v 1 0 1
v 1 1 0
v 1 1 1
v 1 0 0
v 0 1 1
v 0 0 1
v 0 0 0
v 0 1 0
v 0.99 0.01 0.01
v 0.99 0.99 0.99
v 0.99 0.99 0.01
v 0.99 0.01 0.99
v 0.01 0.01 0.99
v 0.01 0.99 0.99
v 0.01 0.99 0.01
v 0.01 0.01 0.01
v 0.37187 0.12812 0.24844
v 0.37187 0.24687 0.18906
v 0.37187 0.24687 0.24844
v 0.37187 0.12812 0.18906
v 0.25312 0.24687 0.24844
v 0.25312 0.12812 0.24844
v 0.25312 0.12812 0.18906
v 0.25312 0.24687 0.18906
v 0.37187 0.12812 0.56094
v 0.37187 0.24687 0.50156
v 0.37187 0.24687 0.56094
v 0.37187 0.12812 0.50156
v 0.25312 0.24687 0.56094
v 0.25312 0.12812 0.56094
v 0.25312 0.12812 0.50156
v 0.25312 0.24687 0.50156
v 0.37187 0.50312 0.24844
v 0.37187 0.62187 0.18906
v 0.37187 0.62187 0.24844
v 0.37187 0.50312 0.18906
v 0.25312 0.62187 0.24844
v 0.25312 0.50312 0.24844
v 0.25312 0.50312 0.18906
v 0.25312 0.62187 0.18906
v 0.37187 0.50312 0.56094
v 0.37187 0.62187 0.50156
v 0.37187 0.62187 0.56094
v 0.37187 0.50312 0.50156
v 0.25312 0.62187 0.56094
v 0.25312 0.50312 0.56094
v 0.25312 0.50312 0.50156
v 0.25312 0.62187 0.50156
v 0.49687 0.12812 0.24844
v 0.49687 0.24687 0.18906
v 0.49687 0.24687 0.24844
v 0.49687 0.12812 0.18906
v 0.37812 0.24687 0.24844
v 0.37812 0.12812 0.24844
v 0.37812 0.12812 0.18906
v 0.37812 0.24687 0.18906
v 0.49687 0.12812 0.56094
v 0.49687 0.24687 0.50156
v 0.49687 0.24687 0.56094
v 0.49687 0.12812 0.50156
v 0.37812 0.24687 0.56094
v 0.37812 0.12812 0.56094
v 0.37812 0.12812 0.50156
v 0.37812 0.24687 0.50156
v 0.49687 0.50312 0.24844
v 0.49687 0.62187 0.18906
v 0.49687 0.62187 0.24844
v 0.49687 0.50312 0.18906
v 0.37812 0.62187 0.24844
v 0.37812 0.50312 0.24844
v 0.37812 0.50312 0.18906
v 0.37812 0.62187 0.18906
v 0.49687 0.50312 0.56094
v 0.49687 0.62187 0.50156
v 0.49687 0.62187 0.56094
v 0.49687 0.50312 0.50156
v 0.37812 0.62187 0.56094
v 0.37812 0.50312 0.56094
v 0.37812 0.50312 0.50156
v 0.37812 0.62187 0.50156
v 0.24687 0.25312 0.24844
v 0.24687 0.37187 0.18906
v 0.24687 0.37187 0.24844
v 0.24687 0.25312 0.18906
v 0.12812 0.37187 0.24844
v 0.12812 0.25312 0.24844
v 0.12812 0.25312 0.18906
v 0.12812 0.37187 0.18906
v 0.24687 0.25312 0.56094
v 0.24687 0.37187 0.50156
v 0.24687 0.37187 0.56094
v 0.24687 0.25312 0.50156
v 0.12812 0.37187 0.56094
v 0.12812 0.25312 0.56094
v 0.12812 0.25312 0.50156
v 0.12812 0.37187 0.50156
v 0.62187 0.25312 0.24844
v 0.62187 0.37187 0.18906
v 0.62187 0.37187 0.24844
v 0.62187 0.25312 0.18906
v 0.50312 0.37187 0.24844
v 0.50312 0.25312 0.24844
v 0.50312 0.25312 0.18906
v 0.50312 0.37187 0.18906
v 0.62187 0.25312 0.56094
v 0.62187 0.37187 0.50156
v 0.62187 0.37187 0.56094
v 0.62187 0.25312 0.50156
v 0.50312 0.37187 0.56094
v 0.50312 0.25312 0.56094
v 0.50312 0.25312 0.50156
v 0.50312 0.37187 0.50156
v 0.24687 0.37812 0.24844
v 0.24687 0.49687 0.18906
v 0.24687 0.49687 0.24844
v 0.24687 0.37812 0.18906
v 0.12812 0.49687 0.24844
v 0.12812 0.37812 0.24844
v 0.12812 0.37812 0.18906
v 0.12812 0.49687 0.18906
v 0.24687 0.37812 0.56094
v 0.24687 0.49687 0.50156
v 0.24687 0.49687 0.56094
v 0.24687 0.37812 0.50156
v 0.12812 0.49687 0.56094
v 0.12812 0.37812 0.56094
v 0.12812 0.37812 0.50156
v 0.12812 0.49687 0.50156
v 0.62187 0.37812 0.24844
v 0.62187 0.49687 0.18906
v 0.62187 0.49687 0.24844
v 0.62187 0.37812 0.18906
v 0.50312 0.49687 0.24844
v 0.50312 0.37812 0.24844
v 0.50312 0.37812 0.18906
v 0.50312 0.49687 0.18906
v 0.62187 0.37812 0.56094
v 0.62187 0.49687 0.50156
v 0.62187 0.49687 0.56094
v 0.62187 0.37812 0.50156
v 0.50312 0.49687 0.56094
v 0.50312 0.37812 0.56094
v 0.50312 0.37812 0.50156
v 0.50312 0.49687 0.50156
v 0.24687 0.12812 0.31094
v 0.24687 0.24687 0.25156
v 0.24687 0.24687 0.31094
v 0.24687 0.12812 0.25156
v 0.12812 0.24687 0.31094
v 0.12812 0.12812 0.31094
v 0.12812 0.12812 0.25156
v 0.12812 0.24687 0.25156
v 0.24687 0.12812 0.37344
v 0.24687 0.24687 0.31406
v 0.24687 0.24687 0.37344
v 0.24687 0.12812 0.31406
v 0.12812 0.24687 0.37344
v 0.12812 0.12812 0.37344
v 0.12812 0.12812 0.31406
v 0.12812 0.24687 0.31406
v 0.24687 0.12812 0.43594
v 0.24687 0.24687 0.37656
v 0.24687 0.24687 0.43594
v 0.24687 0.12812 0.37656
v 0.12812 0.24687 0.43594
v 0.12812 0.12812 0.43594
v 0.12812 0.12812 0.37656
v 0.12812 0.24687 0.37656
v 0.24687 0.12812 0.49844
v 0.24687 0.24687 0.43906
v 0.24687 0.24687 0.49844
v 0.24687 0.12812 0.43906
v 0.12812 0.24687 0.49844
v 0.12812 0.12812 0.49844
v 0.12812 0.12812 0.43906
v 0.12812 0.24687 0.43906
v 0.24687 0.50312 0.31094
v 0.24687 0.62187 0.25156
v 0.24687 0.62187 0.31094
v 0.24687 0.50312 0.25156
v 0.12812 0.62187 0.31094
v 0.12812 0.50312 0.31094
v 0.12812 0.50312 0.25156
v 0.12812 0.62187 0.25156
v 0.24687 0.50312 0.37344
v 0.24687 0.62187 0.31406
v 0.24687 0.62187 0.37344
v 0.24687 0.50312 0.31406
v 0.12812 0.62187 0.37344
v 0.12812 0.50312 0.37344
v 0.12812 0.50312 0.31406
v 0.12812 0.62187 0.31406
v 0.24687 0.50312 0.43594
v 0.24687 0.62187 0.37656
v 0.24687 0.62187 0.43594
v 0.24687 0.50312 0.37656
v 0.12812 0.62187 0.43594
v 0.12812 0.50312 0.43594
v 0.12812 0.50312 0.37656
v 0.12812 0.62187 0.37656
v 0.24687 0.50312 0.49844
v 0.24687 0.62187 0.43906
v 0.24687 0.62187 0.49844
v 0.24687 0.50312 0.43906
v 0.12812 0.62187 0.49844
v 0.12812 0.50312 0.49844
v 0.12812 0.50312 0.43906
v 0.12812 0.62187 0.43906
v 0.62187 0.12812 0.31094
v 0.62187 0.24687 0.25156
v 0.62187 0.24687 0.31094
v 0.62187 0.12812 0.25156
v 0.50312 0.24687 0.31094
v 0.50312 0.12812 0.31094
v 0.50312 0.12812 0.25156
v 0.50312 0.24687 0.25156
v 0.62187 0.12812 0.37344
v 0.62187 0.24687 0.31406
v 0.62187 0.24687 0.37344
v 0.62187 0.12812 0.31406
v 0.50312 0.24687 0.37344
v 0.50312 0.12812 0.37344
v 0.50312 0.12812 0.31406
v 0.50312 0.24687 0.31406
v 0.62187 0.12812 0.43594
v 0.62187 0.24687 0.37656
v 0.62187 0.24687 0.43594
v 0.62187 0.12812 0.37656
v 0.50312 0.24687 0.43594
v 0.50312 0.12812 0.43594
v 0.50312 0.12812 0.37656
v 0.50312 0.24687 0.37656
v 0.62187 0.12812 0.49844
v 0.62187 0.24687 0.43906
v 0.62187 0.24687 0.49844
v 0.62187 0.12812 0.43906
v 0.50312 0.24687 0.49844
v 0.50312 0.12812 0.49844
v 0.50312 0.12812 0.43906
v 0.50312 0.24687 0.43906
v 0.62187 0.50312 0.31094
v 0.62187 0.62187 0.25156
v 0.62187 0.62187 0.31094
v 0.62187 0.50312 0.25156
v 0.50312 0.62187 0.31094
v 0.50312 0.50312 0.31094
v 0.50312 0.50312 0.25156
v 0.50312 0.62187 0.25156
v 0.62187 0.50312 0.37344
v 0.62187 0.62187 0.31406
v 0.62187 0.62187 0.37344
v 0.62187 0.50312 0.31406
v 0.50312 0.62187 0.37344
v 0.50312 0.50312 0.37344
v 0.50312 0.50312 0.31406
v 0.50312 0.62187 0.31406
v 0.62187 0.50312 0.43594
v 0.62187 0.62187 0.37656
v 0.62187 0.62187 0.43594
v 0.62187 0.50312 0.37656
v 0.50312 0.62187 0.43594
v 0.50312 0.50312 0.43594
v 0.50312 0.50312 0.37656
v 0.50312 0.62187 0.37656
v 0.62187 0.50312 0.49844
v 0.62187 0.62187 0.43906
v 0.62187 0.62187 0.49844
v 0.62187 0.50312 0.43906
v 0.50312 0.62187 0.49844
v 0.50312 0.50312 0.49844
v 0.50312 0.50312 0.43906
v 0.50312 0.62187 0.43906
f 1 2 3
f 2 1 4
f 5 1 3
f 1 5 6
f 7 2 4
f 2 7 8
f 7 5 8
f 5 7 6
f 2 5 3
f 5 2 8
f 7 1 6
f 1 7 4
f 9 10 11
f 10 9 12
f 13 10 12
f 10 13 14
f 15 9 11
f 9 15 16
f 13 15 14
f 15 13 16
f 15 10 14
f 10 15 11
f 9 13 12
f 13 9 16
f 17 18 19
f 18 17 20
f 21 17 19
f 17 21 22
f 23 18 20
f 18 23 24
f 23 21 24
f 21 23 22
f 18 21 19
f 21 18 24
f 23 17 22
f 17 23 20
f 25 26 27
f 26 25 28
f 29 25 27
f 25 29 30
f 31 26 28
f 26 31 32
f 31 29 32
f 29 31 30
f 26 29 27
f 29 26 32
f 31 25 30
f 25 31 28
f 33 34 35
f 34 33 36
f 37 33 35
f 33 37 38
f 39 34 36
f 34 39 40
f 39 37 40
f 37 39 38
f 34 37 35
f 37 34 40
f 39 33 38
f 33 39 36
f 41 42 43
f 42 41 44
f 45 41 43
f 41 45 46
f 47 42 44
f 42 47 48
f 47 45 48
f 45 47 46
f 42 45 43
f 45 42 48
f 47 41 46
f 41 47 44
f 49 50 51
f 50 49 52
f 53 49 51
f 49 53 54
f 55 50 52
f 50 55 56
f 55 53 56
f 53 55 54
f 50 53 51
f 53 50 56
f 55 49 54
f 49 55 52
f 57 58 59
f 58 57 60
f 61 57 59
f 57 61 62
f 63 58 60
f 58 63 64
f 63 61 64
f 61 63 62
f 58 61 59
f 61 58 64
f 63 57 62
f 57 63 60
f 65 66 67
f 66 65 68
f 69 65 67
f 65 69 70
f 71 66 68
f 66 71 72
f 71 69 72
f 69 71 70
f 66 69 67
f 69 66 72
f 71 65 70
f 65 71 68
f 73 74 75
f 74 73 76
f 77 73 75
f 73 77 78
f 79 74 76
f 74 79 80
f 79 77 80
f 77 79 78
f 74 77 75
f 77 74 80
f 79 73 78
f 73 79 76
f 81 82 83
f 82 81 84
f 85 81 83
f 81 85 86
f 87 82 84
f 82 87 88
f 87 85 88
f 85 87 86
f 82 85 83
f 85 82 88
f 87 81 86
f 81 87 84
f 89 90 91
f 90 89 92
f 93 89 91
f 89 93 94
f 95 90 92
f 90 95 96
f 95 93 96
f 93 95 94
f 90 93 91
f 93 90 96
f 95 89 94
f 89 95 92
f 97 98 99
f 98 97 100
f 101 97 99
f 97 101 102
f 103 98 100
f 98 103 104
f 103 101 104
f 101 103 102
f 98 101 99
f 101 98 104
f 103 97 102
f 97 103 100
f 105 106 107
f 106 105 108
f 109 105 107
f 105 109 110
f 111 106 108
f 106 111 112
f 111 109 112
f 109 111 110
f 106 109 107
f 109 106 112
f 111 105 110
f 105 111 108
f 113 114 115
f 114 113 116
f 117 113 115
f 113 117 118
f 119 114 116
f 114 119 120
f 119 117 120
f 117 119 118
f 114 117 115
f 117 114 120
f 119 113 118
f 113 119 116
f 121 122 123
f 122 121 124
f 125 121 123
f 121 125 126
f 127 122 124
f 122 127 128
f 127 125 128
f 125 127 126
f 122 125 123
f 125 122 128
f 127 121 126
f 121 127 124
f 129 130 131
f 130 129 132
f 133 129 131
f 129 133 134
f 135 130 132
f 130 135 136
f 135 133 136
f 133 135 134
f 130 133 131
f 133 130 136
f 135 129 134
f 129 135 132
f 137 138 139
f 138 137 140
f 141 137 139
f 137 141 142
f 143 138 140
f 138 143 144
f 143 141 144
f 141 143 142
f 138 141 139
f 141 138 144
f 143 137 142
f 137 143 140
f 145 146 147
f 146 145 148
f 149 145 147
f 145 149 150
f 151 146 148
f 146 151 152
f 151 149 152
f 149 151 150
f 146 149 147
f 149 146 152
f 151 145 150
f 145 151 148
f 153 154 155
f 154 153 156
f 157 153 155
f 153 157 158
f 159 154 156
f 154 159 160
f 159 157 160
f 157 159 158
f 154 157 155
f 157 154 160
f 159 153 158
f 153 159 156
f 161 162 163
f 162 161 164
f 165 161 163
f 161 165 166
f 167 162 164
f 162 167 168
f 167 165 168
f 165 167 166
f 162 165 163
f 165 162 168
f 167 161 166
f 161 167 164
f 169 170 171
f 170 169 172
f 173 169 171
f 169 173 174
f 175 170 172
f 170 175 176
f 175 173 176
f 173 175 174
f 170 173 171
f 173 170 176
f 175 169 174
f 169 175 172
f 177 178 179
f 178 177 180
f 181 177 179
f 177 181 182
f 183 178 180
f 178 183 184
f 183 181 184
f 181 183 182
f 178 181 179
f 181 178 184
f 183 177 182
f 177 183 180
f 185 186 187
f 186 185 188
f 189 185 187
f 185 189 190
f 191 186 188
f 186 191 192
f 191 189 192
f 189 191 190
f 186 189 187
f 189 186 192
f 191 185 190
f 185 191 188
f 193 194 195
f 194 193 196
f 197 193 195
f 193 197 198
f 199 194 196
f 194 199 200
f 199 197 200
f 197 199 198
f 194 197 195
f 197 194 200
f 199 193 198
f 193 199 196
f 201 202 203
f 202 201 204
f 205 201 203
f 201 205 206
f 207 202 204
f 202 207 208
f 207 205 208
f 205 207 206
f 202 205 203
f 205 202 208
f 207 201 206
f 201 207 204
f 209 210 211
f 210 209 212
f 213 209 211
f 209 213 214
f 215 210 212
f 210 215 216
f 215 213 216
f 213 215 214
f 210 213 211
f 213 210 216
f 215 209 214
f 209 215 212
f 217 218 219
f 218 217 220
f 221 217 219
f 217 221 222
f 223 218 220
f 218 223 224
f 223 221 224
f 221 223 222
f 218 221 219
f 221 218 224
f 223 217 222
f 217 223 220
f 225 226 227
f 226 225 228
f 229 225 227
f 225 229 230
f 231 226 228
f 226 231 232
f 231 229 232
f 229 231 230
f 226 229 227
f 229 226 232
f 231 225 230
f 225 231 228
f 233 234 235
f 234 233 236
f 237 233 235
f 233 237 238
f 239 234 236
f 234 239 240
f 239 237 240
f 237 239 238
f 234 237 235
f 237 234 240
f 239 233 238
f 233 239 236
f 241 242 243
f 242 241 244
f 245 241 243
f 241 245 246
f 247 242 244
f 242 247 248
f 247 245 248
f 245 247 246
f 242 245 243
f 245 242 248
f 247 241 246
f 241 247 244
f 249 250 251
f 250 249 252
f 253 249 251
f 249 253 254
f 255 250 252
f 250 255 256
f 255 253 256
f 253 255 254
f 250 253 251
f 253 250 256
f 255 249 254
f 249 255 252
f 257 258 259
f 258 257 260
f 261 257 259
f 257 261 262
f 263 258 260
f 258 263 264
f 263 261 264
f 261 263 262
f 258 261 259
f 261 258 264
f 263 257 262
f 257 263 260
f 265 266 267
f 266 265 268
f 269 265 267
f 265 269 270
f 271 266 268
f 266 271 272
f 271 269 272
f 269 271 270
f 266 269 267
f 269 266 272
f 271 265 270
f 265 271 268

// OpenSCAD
translate([0.3125, 0.1875, 0.21875]) color([0.23874719597172656, 0.5159213977515871, 0.8042715508319355]) cube([0.11875, 0.11875, 0.059375], center=true);
translate([0.3125, 0.1875, 0.53125]) color([0.6755197251802578, 0.41487488756696345, 0.5733633065217538]) cube([0.11875, 0.11875, 0.059375], center=true);
translate([0.3125, 0.5625, 0.21875]) color([0.8352652083788017, 0.4789645616530247, 0.8888242662849705]) cube([0.11875, 0.11875, 0.059375], center=true);
translate([0.3125, 0.5625, 0.53125]) color([0.7977003312522131, 0.4430245559395397, 0.5757872208285841]) cube([0.11875, 0.11875, 0.059375], center=true);
translate([0.4375, 0.1875, 0.21875]) color([0.18894415855786206, 0.8084526775944827, 0.5240727557148024]) cube([0.11875, 0.11875, 0.059375], center=true);
translate([0.4375, 0.1875, 0.53125]) color([0.33009817895383553, 0.6358447971330878, 0.274476683198677]) cube([0.11875, 0.11875, 0.059375], center=true);
translate([0.4375, 0.5625, 0.21875]) color([0.7036882936284021, 0.9548751840233447, 0.5755708060880032]) cube([0.11875, 0.11875, 0.059375], center=true);
translate([0.4375, 0.5625, 0.53125]) color([0.41204698353559877, 0.5796286851254486, 0.28286322414623355]) cube([0.11875, 0.11875, 0.059375], center=true);
translate([0.1875, 0.3125, 0.21875]) color([0.83488960487533, 0.7968053445508819, 0.9111606805714901]) cube([0.11875, 0.11875, 0.059375], center=true);
translate([0.1875, 0.3125, 0.53125]) color([0.24277728252059738, 0.2698201644401115, 0.25372921938475945]) cube([0.11875, 0.11875, 0.059375], center=true);
translate([0.5625, 0.3125, 0.21875]) color([0.3248429479181304, 0.33731838939050207, 0.46012102584031667]) cube([0.11875, 0.11875, 0.059375], center=true);
translate([0.5625, 0.3125, 0.53125]) color([0.4972140619467261, 0.4460540182101679, 0.582257111213957]) cube([0.11875, 0.11875, 0.059375], center=true);
translate([0.1875, 0.4375, 0.21875]) color([0.38189019333285656, 0.9329183366158048, 0.74346568951076]) cube([0.11875, 0.11875, 0.059375], center=true);
translate([0.1875, 0.4375, 0.53125]) color([0.10367473231816282, 0.6513301228797536, 0.21210212161149367]) cube([0.11875, 0.11875, 0.059375], center=true);
translate([0.5625, 0.4375, 0.21875]) color([0.4071949612628585, 0.6715659813617996, 0.17871221391606673]) cube([0.11875, 0.11875, 0.059375], center=true);
translate([0.5625, 0.4375, 0.53125]) color([0.17752412341011714, 0.6556599876579107, 0.7040052939421468]) cube([0.11875, 0.11875, 0.059375], center=true);
translate([0.1875, 0.1875, 0.28125]) color([0.9236087761692187, 0.21340315940002685, 0.5989435772305987]) cube([0.11875, 0.11875, 0.059375], center=true);
translate([0.1875, 0.1875, 0.34375]) color([0.8450733127471588, 0.6003349610680997, 0.5954496070156984]) cube([0.11875, 0.11875, 0.059375], center=true);
translate([0.1875, 0.1875, 0.40625]) color([0.920709623693076, 0.4233833186292486, 0.4754938941291812]) cube([0.11875, 0.11875, 0.059375], center=true);
translate([0.1875, 0.1875, 0.46875]) color([0.872421437716006, 0.9767589381362137, 0.9086126193256788]) cube([0.11875, 0.11875, 0.059375], center=true);
translate([0.1875, 0.5625, 0.28125]) color([0.7884233486788577, 0.8262914624918754, 0.6636415038118221]) cube([0.11875, 0.11875, 0.059375], center=true);
translate([0.1875, 0.5625, 0.34375]) color([0.36270118963089737, 0.5138414630226216, 0.14357255994509865]) cube([0.11875, 0.11875, 0.059375], center=true);
translate([0.1875, 0.5625, 0.40625]) color([0.466624584989368, 0.29734697142143796, 0.9844700368526675]) cube([0.11875, 0.11875, 0.059375], center=true);
translate([0.1875, 0.5625, 0.46875]) color([0.6752891164641136, 0.29017518075598103, 0.4342964607752302]) cube([0.11875, 0.11875, 0.059375], center=true);
translate([0.5625, 0.1875, 0.28125]) color([0.773003957160343, 0.565247166210502, 0.9239404304157245]) cube([0.11875, 0.11875, 0.059375], center=true);
translate([0.5625, 0.1875, 0.34375]) color([0.16032310979410902, 0.8355206000915061, 0.5688487402091276]) cube([0.11875, 0.11875, 0.059375], center=true);
translate([0.5625, 0.1875, 0.40625]) color([0.20030491603062106, 0.9799112189115262, 0.7788088383598656]) cube([0.11875, 0.11875, 0.059375], center=true);
translate([0.5625, 0.1875, 0.46875]) color([0.3331229107175697, 0.956723341350572, 0.8892995412421422]) cube([0.11875, 0.11875, 0.059375], center=true);
translate([0.5625, 0.5625, 0.28125]) color([0.9938355783742772, 0.5564778243748569, 0.9329279768345969]) cube([0.11875, 0.11875, 0.059375], center=true);
translate([0.5625, 0.5625, 0.34375]) color([0.35340897744289224, 0.12062022214202717, 0.7238287945893779]) cube([0.11875, 0.11875, 0.059375], center=true);
translate([0.5625, 0.5625, 0.40625]) color([0.8432397019629626, 0.2883830928152321, 0.23139986036280558]) cube([0.11875, 0.11875, 0.059375], center=true);
translate([0.5625, 0.5625, 0.46875]) color([0.0180364627349191, 0.35314011923198985, 0.9589424474672257]) cube([0.11875, 0.11875, 0.059375], center=true);
color([0.3,0.3,0.3,0.3]) difference() { cube([1,1,1]); translate([0.01,0.01,0.01]) cube([0.98,0.98,0.98]); }
